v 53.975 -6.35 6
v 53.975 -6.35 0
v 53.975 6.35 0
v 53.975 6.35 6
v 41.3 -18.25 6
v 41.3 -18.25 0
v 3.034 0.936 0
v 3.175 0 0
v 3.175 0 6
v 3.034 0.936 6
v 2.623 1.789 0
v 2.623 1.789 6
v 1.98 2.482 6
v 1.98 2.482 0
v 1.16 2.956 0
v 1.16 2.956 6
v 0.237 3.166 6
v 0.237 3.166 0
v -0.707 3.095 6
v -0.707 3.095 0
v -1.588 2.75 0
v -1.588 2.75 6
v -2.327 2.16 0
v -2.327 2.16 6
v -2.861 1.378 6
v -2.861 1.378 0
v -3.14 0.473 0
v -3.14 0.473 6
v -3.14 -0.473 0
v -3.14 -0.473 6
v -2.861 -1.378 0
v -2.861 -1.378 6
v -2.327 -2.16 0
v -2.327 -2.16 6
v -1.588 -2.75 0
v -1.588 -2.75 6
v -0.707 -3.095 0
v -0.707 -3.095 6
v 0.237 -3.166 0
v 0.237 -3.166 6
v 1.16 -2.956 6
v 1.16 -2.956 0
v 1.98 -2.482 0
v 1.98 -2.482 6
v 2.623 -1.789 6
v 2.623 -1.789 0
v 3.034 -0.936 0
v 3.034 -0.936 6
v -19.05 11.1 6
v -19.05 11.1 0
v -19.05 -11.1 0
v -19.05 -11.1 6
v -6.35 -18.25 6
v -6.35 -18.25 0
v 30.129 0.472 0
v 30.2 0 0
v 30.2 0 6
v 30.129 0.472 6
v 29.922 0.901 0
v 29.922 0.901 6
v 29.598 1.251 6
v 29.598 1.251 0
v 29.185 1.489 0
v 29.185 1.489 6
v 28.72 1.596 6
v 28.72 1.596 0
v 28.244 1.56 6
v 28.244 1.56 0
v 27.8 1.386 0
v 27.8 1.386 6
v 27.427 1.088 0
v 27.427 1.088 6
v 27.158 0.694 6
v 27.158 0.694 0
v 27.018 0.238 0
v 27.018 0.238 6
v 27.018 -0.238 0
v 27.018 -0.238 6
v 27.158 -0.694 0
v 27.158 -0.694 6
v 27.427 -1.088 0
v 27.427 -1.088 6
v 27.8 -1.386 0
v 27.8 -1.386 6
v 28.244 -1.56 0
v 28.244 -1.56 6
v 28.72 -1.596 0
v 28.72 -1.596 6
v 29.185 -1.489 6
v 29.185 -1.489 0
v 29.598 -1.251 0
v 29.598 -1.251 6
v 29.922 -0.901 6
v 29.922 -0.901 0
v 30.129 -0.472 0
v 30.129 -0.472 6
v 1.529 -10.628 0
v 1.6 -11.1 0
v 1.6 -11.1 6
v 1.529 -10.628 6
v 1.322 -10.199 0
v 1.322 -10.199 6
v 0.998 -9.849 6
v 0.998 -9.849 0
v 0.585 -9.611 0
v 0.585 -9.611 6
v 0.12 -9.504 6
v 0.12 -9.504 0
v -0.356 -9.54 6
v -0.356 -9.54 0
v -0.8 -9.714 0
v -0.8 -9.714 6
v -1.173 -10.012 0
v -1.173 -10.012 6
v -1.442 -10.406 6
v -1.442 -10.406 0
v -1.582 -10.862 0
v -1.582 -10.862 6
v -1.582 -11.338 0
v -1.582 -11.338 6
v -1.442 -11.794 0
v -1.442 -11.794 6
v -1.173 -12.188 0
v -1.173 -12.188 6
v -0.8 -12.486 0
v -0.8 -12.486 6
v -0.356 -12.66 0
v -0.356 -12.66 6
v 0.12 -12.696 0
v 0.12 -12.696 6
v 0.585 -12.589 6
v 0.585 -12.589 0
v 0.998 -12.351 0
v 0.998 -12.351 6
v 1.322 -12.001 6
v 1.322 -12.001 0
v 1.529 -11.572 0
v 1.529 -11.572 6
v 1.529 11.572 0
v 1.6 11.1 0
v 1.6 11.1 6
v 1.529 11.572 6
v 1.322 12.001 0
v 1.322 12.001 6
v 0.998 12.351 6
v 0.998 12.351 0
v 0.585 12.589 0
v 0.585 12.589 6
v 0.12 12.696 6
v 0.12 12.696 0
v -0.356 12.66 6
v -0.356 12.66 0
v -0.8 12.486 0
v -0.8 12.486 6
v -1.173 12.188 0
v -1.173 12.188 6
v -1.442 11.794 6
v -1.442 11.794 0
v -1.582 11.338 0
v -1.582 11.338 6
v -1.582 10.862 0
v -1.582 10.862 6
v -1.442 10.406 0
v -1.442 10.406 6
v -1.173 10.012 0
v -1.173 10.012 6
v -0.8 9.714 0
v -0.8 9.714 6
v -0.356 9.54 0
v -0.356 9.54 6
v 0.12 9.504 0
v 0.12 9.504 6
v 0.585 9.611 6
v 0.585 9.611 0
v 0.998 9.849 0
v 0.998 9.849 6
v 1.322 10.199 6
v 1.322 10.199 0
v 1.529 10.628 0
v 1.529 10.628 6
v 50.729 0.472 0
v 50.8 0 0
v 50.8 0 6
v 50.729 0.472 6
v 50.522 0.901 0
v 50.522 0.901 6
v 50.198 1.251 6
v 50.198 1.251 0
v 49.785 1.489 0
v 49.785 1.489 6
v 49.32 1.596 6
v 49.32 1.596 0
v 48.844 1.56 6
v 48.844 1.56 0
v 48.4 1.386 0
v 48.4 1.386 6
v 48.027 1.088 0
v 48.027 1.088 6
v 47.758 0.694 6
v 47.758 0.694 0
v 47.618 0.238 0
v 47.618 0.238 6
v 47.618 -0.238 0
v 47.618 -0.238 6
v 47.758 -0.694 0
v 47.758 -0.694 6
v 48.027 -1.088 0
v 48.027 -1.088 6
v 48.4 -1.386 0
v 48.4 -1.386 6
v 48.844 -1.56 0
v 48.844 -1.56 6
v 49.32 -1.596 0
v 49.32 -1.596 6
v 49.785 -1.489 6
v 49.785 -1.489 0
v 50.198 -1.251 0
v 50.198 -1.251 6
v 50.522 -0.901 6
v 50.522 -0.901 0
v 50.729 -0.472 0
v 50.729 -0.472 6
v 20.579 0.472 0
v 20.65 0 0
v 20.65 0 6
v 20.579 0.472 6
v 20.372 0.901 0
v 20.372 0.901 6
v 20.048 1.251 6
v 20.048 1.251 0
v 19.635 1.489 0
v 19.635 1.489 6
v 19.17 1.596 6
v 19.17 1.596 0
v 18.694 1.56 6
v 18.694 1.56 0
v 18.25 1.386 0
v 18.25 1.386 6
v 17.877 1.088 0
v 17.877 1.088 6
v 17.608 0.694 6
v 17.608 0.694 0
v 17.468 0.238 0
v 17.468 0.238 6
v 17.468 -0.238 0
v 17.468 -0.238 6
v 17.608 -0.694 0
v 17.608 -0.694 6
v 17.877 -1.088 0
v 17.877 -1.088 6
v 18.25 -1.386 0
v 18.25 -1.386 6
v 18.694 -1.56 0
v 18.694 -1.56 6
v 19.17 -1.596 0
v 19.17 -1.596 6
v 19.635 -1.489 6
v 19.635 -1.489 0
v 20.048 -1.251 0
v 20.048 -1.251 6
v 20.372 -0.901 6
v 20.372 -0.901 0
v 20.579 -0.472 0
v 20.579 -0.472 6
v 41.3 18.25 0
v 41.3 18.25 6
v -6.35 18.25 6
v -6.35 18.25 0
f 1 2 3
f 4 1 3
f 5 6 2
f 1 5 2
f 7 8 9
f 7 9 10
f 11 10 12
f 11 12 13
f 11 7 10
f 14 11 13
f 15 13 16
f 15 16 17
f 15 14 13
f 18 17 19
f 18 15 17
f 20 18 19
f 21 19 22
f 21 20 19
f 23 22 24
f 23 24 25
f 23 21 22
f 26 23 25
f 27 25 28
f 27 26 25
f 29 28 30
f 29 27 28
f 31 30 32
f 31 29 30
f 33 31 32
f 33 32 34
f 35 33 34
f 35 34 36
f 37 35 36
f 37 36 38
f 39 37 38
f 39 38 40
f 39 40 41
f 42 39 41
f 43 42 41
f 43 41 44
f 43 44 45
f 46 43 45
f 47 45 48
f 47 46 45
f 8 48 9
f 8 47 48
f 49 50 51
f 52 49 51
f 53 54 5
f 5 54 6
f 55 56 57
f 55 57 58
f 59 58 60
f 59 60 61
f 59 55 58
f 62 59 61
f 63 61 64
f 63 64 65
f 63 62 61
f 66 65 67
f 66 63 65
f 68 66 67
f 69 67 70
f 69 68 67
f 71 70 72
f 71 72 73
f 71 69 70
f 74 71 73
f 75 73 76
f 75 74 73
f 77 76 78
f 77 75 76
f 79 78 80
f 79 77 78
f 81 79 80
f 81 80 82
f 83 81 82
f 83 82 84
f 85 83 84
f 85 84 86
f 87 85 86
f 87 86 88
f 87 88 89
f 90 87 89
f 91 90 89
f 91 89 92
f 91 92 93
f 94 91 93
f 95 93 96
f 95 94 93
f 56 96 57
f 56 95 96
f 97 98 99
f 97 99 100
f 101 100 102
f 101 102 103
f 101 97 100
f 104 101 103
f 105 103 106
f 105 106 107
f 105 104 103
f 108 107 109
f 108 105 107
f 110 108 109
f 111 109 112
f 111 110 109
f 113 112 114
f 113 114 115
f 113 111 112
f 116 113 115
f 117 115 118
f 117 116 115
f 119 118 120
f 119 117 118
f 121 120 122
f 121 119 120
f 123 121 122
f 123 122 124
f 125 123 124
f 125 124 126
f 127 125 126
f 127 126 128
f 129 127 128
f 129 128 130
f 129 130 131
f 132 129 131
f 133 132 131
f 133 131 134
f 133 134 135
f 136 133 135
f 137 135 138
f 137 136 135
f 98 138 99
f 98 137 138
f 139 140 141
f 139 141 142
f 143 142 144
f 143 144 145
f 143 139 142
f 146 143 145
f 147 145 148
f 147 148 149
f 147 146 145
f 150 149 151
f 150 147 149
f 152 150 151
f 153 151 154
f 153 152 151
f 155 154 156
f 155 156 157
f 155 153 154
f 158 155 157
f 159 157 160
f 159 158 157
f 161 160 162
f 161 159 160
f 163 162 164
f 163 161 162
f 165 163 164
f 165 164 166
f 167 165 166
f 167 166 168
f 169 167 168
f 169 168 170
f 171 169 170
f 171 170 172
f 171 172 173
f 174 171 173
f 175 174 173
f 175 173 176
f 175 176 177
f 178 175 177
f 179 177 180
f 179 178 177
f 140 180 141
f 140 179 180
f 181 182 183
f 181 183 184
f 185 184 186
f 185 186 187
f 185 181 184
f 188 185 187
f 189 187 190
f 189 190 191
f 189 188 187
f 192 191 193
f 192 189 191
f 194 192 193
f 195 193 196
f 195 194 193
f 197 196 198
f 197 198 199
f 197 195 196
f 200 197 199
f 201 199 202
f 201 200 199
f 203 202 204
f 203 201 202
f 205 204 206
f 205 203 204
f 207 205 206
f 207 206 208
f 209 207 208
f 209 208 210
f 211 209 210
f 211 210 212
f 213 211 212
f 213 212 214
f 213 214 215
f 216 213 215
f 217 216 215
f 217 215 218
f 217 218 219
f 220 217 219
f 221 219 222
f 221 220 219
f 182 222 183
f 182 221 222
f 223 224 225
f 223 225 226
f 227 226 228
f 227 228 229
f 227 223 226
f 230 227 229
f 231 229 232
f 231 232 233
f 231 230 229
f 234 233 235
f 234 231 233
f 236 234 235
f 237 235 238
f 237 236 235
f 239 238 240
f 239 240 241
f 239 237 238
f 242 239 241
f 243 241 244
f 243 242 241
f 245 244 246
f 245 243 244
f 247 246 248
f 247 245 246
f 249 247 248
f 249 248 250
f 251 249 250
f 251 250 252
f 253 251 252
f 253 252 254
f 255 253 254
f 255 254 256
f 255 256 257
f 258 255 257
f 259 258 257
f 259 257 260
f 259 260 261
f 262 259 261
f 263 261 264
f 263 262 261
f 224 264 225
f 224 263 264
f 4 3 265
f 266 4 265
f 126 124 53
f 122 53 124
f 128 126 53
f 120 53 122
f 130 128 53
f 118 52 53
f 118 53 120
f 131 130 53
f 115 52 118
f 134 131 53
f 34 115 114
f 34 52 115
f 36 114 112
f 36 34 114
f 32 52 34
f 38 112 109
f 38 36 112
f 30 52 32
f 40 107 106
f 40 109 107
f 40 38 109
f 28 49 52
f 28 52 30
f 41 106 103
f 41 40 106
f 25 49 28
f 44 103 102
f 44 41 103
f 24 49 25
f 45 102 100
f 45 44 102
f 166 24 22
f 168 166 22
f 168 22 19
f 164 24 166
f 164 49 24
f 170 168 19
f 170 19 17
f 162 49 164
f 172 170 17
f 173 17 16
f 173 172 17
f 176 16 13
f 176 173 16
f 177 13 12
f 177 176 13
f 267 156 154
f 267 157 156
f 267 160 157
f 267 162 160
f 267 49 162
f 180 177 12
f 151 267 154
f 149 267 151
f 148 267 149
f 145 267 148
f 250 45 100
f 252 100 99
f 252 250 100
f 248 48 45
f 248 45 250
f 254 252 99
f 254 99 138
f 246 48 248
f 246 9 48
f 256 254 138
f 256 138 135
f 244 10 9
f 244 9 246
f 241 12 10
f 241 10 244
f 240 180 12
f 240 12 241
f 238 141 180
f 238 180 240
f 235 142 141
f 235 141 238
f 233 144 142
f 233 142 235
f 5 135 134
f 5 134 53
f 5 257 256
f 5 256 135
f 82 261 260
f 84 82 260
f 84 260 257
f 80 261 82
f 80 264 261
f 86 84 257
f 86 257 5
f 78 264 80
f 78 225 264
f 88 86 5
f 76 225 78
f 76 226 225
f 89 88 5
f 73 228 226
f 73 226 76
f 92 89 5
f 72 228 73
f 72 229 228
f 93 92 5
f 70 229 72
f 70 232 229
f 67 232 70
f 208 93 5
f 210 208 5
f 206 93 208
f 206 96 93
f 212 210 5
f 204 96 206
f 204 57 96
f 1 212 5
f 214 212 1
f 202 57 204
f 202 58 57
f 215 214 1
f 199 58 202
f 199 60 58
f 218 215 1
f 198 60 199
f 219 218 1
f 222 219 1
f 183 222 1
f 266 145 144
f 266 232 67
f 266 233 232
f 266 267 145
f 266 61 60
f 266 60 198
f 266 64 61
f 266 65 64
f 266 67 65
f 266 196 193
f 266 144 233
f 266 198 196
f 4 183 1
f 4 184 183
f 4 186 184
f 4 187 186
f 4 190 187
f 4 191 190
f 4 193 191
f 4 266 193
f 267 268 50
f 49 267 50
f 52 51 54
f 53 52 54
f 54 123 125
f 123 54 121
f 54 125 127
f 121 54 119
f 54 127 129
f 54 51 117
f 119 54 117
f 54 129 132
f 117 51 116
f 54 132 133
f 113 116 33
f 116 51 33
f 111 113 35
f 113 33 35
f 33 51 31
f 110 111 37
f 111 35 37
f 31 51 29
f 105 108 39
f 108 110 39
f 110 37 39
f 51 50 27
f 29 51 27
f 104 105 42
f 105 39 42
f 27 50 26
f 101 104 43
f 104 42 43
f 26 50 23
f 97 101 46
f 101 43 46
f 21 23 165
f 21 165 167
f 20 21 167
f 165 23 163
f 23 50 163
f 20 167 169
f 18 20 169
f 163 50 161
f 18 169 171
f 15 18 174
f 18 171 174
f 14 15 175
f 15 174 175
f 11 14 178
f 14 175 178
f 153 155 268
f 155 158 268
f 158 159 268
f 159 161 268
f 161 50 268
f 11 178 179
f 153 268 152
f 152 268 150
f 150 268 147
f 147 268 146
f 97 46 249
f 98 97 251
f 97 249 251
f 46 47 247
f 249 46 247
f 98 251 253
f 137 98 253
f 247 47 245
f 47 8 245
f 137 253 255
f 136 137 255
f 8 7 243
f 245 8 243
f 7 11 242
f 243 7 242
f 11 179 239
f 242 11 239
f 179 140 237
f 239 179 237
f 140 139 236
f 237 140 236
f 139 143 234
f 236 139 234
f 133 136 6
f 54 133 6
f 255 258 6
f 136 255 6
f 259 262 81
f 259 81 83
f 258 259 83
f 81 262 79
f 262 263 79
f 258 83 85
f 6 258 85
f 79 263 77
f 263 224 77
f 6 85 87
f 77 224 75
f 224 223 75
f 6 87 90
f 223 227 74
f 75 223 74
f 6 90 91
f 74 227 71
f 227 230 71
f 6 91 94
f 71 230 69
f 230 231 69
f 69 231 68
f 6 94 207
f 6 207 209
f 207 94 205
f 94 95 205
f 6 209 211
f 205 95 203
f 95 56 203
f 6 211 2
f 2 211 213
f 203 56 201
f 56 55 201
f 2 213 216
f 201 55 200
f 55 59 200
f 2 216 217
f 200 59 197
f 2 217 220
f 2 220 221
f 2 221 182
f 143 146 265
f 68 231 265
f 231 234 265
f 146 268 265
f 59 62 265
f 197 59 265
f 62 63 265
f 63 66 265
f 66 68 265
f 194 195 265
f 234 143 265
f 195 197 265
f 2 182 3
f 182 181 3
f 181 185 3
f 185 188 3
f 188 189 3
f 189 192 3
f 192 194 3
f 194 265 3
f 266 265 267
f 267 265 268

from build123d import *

# Parameters (mm, degrees)
SKETCH1_R           = 1.6
SKETCH1_R_2         = 3.175
BOSS_EXTRUDE1_DEPTH = 6


with BuildPart() as part:
    # Sketch1 → Boss-Extrude1 (new body)
    with BuildSketch(Plane.XY):
        Polygon((-19.05, -11.1), (-6.35, -18.25), (41.3, -18.25), (53.975, -6.35), (53.975, 6.35), (41.3, 18.25), (-6.35, 18.25), (-19.05, 11.1), align=None)
        with Locations((19.05, 0)):
            Circle(SKETCH1_R, mode=Mode.SUBTRACT)
        with Locations((28.6, 0)):
            Circle(SKETCH1_R, mode=Mode.SUBTRACT)
        with Locations((49.2, 0)):
            Circle(SKETCH1_R, mode=Mode.SUBTRACT)
        Circle(SKETCH1_R_2, mode=Mode.SUBTRACT)
        with Locations((0, 11.1)):
            Circle(SKETCH1_R, mode=Mode.SUBTRACT)
        with Locations((0, -11.1)):
            Circle(SKETCH1_R, mode=Mode.SUBTRACT)
    extrude(amount=BOSS_EXTRUDE1_DEPTH)


solid = part.part
